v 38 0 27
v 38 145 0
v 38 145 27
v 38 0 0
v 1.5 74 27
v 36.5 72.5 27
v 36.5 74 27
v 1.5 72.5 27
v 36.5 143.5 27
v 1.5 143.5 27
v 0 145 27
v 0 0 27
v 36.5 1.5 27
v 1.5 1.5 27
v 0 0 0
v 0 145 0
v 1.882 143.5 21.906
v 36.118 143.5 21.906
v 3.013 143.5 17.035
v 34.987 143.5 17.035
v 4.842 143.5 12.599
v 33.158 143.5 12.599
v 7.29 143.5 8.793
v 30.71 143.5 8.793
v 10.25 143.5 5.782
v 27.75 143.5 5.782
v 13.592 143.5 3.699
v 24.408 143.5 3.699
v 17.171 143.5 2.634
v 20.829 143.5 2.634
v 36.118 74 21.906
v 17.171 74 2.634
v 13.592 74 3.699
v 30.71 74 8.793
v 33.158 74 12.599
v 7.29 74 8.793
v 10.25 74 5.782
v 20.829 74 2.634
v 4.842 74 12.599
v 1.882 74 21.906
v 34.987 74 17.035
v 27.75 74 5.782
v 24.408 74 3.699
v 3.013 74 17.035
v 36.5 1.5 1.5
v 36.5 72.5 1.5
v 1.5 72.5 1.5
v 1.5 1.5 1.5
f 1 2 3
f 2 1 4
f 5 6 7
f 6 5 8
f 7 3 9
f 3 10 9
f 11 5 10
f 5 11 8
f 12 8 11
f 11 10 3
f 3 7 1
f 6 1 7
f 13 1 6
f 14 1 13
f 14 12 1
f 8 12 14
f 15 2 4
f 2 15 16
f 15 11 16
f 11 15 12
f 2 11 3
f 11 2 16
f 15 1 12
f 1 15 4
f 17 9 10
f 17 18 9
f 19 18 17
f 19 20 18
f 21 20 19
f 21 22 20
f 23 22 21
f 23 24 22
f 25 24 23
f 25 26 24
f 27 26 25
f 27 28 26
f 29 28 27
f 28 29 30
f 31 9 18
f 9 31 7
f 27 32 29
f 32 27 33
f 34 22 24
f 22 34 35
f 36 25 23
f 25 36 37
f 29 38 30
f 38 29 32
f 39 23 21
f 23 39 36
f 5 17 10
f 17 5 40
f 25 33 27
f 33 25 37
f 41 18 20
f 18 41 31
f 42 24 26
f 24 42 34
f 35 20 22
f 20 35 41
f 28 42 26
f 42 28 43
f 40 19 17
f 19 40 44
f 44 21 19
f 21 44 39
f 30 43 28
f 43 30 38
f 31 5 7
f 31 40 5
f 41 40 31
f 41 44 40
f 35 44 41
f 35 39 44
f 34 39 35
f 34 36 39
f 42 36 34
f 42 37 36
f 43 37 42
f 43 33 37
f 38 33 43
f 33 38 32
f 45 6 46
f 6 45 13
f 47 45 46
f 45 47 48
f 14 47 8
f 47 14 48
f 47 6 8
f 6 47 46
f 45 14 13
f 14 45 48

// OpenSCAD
/* [Box Parameters] */


boxWidth = 38;
boxDepth = 145;
boxHeight = 27;
cylinderHeight = 35;
wallThick = 1.5;


difference() {
    cube([boxWidth,boxDepth,boxHeight]);
    color("blue") scale([1,1,1.4]) translate([boxWidth/2, boxDepth-wallThick , boxHeight/1.4])
    rotate ([90, 0,0]) cylinder(h=boxDepth/2-wallThick*2, d=boxWidth-wallThick*2);
    color("pink") translate([wallThick, wallThick, wallThick]) cube([boxWidth-(wallThick*2),boxDepth/2-wallThick,boxHeight]);
}
